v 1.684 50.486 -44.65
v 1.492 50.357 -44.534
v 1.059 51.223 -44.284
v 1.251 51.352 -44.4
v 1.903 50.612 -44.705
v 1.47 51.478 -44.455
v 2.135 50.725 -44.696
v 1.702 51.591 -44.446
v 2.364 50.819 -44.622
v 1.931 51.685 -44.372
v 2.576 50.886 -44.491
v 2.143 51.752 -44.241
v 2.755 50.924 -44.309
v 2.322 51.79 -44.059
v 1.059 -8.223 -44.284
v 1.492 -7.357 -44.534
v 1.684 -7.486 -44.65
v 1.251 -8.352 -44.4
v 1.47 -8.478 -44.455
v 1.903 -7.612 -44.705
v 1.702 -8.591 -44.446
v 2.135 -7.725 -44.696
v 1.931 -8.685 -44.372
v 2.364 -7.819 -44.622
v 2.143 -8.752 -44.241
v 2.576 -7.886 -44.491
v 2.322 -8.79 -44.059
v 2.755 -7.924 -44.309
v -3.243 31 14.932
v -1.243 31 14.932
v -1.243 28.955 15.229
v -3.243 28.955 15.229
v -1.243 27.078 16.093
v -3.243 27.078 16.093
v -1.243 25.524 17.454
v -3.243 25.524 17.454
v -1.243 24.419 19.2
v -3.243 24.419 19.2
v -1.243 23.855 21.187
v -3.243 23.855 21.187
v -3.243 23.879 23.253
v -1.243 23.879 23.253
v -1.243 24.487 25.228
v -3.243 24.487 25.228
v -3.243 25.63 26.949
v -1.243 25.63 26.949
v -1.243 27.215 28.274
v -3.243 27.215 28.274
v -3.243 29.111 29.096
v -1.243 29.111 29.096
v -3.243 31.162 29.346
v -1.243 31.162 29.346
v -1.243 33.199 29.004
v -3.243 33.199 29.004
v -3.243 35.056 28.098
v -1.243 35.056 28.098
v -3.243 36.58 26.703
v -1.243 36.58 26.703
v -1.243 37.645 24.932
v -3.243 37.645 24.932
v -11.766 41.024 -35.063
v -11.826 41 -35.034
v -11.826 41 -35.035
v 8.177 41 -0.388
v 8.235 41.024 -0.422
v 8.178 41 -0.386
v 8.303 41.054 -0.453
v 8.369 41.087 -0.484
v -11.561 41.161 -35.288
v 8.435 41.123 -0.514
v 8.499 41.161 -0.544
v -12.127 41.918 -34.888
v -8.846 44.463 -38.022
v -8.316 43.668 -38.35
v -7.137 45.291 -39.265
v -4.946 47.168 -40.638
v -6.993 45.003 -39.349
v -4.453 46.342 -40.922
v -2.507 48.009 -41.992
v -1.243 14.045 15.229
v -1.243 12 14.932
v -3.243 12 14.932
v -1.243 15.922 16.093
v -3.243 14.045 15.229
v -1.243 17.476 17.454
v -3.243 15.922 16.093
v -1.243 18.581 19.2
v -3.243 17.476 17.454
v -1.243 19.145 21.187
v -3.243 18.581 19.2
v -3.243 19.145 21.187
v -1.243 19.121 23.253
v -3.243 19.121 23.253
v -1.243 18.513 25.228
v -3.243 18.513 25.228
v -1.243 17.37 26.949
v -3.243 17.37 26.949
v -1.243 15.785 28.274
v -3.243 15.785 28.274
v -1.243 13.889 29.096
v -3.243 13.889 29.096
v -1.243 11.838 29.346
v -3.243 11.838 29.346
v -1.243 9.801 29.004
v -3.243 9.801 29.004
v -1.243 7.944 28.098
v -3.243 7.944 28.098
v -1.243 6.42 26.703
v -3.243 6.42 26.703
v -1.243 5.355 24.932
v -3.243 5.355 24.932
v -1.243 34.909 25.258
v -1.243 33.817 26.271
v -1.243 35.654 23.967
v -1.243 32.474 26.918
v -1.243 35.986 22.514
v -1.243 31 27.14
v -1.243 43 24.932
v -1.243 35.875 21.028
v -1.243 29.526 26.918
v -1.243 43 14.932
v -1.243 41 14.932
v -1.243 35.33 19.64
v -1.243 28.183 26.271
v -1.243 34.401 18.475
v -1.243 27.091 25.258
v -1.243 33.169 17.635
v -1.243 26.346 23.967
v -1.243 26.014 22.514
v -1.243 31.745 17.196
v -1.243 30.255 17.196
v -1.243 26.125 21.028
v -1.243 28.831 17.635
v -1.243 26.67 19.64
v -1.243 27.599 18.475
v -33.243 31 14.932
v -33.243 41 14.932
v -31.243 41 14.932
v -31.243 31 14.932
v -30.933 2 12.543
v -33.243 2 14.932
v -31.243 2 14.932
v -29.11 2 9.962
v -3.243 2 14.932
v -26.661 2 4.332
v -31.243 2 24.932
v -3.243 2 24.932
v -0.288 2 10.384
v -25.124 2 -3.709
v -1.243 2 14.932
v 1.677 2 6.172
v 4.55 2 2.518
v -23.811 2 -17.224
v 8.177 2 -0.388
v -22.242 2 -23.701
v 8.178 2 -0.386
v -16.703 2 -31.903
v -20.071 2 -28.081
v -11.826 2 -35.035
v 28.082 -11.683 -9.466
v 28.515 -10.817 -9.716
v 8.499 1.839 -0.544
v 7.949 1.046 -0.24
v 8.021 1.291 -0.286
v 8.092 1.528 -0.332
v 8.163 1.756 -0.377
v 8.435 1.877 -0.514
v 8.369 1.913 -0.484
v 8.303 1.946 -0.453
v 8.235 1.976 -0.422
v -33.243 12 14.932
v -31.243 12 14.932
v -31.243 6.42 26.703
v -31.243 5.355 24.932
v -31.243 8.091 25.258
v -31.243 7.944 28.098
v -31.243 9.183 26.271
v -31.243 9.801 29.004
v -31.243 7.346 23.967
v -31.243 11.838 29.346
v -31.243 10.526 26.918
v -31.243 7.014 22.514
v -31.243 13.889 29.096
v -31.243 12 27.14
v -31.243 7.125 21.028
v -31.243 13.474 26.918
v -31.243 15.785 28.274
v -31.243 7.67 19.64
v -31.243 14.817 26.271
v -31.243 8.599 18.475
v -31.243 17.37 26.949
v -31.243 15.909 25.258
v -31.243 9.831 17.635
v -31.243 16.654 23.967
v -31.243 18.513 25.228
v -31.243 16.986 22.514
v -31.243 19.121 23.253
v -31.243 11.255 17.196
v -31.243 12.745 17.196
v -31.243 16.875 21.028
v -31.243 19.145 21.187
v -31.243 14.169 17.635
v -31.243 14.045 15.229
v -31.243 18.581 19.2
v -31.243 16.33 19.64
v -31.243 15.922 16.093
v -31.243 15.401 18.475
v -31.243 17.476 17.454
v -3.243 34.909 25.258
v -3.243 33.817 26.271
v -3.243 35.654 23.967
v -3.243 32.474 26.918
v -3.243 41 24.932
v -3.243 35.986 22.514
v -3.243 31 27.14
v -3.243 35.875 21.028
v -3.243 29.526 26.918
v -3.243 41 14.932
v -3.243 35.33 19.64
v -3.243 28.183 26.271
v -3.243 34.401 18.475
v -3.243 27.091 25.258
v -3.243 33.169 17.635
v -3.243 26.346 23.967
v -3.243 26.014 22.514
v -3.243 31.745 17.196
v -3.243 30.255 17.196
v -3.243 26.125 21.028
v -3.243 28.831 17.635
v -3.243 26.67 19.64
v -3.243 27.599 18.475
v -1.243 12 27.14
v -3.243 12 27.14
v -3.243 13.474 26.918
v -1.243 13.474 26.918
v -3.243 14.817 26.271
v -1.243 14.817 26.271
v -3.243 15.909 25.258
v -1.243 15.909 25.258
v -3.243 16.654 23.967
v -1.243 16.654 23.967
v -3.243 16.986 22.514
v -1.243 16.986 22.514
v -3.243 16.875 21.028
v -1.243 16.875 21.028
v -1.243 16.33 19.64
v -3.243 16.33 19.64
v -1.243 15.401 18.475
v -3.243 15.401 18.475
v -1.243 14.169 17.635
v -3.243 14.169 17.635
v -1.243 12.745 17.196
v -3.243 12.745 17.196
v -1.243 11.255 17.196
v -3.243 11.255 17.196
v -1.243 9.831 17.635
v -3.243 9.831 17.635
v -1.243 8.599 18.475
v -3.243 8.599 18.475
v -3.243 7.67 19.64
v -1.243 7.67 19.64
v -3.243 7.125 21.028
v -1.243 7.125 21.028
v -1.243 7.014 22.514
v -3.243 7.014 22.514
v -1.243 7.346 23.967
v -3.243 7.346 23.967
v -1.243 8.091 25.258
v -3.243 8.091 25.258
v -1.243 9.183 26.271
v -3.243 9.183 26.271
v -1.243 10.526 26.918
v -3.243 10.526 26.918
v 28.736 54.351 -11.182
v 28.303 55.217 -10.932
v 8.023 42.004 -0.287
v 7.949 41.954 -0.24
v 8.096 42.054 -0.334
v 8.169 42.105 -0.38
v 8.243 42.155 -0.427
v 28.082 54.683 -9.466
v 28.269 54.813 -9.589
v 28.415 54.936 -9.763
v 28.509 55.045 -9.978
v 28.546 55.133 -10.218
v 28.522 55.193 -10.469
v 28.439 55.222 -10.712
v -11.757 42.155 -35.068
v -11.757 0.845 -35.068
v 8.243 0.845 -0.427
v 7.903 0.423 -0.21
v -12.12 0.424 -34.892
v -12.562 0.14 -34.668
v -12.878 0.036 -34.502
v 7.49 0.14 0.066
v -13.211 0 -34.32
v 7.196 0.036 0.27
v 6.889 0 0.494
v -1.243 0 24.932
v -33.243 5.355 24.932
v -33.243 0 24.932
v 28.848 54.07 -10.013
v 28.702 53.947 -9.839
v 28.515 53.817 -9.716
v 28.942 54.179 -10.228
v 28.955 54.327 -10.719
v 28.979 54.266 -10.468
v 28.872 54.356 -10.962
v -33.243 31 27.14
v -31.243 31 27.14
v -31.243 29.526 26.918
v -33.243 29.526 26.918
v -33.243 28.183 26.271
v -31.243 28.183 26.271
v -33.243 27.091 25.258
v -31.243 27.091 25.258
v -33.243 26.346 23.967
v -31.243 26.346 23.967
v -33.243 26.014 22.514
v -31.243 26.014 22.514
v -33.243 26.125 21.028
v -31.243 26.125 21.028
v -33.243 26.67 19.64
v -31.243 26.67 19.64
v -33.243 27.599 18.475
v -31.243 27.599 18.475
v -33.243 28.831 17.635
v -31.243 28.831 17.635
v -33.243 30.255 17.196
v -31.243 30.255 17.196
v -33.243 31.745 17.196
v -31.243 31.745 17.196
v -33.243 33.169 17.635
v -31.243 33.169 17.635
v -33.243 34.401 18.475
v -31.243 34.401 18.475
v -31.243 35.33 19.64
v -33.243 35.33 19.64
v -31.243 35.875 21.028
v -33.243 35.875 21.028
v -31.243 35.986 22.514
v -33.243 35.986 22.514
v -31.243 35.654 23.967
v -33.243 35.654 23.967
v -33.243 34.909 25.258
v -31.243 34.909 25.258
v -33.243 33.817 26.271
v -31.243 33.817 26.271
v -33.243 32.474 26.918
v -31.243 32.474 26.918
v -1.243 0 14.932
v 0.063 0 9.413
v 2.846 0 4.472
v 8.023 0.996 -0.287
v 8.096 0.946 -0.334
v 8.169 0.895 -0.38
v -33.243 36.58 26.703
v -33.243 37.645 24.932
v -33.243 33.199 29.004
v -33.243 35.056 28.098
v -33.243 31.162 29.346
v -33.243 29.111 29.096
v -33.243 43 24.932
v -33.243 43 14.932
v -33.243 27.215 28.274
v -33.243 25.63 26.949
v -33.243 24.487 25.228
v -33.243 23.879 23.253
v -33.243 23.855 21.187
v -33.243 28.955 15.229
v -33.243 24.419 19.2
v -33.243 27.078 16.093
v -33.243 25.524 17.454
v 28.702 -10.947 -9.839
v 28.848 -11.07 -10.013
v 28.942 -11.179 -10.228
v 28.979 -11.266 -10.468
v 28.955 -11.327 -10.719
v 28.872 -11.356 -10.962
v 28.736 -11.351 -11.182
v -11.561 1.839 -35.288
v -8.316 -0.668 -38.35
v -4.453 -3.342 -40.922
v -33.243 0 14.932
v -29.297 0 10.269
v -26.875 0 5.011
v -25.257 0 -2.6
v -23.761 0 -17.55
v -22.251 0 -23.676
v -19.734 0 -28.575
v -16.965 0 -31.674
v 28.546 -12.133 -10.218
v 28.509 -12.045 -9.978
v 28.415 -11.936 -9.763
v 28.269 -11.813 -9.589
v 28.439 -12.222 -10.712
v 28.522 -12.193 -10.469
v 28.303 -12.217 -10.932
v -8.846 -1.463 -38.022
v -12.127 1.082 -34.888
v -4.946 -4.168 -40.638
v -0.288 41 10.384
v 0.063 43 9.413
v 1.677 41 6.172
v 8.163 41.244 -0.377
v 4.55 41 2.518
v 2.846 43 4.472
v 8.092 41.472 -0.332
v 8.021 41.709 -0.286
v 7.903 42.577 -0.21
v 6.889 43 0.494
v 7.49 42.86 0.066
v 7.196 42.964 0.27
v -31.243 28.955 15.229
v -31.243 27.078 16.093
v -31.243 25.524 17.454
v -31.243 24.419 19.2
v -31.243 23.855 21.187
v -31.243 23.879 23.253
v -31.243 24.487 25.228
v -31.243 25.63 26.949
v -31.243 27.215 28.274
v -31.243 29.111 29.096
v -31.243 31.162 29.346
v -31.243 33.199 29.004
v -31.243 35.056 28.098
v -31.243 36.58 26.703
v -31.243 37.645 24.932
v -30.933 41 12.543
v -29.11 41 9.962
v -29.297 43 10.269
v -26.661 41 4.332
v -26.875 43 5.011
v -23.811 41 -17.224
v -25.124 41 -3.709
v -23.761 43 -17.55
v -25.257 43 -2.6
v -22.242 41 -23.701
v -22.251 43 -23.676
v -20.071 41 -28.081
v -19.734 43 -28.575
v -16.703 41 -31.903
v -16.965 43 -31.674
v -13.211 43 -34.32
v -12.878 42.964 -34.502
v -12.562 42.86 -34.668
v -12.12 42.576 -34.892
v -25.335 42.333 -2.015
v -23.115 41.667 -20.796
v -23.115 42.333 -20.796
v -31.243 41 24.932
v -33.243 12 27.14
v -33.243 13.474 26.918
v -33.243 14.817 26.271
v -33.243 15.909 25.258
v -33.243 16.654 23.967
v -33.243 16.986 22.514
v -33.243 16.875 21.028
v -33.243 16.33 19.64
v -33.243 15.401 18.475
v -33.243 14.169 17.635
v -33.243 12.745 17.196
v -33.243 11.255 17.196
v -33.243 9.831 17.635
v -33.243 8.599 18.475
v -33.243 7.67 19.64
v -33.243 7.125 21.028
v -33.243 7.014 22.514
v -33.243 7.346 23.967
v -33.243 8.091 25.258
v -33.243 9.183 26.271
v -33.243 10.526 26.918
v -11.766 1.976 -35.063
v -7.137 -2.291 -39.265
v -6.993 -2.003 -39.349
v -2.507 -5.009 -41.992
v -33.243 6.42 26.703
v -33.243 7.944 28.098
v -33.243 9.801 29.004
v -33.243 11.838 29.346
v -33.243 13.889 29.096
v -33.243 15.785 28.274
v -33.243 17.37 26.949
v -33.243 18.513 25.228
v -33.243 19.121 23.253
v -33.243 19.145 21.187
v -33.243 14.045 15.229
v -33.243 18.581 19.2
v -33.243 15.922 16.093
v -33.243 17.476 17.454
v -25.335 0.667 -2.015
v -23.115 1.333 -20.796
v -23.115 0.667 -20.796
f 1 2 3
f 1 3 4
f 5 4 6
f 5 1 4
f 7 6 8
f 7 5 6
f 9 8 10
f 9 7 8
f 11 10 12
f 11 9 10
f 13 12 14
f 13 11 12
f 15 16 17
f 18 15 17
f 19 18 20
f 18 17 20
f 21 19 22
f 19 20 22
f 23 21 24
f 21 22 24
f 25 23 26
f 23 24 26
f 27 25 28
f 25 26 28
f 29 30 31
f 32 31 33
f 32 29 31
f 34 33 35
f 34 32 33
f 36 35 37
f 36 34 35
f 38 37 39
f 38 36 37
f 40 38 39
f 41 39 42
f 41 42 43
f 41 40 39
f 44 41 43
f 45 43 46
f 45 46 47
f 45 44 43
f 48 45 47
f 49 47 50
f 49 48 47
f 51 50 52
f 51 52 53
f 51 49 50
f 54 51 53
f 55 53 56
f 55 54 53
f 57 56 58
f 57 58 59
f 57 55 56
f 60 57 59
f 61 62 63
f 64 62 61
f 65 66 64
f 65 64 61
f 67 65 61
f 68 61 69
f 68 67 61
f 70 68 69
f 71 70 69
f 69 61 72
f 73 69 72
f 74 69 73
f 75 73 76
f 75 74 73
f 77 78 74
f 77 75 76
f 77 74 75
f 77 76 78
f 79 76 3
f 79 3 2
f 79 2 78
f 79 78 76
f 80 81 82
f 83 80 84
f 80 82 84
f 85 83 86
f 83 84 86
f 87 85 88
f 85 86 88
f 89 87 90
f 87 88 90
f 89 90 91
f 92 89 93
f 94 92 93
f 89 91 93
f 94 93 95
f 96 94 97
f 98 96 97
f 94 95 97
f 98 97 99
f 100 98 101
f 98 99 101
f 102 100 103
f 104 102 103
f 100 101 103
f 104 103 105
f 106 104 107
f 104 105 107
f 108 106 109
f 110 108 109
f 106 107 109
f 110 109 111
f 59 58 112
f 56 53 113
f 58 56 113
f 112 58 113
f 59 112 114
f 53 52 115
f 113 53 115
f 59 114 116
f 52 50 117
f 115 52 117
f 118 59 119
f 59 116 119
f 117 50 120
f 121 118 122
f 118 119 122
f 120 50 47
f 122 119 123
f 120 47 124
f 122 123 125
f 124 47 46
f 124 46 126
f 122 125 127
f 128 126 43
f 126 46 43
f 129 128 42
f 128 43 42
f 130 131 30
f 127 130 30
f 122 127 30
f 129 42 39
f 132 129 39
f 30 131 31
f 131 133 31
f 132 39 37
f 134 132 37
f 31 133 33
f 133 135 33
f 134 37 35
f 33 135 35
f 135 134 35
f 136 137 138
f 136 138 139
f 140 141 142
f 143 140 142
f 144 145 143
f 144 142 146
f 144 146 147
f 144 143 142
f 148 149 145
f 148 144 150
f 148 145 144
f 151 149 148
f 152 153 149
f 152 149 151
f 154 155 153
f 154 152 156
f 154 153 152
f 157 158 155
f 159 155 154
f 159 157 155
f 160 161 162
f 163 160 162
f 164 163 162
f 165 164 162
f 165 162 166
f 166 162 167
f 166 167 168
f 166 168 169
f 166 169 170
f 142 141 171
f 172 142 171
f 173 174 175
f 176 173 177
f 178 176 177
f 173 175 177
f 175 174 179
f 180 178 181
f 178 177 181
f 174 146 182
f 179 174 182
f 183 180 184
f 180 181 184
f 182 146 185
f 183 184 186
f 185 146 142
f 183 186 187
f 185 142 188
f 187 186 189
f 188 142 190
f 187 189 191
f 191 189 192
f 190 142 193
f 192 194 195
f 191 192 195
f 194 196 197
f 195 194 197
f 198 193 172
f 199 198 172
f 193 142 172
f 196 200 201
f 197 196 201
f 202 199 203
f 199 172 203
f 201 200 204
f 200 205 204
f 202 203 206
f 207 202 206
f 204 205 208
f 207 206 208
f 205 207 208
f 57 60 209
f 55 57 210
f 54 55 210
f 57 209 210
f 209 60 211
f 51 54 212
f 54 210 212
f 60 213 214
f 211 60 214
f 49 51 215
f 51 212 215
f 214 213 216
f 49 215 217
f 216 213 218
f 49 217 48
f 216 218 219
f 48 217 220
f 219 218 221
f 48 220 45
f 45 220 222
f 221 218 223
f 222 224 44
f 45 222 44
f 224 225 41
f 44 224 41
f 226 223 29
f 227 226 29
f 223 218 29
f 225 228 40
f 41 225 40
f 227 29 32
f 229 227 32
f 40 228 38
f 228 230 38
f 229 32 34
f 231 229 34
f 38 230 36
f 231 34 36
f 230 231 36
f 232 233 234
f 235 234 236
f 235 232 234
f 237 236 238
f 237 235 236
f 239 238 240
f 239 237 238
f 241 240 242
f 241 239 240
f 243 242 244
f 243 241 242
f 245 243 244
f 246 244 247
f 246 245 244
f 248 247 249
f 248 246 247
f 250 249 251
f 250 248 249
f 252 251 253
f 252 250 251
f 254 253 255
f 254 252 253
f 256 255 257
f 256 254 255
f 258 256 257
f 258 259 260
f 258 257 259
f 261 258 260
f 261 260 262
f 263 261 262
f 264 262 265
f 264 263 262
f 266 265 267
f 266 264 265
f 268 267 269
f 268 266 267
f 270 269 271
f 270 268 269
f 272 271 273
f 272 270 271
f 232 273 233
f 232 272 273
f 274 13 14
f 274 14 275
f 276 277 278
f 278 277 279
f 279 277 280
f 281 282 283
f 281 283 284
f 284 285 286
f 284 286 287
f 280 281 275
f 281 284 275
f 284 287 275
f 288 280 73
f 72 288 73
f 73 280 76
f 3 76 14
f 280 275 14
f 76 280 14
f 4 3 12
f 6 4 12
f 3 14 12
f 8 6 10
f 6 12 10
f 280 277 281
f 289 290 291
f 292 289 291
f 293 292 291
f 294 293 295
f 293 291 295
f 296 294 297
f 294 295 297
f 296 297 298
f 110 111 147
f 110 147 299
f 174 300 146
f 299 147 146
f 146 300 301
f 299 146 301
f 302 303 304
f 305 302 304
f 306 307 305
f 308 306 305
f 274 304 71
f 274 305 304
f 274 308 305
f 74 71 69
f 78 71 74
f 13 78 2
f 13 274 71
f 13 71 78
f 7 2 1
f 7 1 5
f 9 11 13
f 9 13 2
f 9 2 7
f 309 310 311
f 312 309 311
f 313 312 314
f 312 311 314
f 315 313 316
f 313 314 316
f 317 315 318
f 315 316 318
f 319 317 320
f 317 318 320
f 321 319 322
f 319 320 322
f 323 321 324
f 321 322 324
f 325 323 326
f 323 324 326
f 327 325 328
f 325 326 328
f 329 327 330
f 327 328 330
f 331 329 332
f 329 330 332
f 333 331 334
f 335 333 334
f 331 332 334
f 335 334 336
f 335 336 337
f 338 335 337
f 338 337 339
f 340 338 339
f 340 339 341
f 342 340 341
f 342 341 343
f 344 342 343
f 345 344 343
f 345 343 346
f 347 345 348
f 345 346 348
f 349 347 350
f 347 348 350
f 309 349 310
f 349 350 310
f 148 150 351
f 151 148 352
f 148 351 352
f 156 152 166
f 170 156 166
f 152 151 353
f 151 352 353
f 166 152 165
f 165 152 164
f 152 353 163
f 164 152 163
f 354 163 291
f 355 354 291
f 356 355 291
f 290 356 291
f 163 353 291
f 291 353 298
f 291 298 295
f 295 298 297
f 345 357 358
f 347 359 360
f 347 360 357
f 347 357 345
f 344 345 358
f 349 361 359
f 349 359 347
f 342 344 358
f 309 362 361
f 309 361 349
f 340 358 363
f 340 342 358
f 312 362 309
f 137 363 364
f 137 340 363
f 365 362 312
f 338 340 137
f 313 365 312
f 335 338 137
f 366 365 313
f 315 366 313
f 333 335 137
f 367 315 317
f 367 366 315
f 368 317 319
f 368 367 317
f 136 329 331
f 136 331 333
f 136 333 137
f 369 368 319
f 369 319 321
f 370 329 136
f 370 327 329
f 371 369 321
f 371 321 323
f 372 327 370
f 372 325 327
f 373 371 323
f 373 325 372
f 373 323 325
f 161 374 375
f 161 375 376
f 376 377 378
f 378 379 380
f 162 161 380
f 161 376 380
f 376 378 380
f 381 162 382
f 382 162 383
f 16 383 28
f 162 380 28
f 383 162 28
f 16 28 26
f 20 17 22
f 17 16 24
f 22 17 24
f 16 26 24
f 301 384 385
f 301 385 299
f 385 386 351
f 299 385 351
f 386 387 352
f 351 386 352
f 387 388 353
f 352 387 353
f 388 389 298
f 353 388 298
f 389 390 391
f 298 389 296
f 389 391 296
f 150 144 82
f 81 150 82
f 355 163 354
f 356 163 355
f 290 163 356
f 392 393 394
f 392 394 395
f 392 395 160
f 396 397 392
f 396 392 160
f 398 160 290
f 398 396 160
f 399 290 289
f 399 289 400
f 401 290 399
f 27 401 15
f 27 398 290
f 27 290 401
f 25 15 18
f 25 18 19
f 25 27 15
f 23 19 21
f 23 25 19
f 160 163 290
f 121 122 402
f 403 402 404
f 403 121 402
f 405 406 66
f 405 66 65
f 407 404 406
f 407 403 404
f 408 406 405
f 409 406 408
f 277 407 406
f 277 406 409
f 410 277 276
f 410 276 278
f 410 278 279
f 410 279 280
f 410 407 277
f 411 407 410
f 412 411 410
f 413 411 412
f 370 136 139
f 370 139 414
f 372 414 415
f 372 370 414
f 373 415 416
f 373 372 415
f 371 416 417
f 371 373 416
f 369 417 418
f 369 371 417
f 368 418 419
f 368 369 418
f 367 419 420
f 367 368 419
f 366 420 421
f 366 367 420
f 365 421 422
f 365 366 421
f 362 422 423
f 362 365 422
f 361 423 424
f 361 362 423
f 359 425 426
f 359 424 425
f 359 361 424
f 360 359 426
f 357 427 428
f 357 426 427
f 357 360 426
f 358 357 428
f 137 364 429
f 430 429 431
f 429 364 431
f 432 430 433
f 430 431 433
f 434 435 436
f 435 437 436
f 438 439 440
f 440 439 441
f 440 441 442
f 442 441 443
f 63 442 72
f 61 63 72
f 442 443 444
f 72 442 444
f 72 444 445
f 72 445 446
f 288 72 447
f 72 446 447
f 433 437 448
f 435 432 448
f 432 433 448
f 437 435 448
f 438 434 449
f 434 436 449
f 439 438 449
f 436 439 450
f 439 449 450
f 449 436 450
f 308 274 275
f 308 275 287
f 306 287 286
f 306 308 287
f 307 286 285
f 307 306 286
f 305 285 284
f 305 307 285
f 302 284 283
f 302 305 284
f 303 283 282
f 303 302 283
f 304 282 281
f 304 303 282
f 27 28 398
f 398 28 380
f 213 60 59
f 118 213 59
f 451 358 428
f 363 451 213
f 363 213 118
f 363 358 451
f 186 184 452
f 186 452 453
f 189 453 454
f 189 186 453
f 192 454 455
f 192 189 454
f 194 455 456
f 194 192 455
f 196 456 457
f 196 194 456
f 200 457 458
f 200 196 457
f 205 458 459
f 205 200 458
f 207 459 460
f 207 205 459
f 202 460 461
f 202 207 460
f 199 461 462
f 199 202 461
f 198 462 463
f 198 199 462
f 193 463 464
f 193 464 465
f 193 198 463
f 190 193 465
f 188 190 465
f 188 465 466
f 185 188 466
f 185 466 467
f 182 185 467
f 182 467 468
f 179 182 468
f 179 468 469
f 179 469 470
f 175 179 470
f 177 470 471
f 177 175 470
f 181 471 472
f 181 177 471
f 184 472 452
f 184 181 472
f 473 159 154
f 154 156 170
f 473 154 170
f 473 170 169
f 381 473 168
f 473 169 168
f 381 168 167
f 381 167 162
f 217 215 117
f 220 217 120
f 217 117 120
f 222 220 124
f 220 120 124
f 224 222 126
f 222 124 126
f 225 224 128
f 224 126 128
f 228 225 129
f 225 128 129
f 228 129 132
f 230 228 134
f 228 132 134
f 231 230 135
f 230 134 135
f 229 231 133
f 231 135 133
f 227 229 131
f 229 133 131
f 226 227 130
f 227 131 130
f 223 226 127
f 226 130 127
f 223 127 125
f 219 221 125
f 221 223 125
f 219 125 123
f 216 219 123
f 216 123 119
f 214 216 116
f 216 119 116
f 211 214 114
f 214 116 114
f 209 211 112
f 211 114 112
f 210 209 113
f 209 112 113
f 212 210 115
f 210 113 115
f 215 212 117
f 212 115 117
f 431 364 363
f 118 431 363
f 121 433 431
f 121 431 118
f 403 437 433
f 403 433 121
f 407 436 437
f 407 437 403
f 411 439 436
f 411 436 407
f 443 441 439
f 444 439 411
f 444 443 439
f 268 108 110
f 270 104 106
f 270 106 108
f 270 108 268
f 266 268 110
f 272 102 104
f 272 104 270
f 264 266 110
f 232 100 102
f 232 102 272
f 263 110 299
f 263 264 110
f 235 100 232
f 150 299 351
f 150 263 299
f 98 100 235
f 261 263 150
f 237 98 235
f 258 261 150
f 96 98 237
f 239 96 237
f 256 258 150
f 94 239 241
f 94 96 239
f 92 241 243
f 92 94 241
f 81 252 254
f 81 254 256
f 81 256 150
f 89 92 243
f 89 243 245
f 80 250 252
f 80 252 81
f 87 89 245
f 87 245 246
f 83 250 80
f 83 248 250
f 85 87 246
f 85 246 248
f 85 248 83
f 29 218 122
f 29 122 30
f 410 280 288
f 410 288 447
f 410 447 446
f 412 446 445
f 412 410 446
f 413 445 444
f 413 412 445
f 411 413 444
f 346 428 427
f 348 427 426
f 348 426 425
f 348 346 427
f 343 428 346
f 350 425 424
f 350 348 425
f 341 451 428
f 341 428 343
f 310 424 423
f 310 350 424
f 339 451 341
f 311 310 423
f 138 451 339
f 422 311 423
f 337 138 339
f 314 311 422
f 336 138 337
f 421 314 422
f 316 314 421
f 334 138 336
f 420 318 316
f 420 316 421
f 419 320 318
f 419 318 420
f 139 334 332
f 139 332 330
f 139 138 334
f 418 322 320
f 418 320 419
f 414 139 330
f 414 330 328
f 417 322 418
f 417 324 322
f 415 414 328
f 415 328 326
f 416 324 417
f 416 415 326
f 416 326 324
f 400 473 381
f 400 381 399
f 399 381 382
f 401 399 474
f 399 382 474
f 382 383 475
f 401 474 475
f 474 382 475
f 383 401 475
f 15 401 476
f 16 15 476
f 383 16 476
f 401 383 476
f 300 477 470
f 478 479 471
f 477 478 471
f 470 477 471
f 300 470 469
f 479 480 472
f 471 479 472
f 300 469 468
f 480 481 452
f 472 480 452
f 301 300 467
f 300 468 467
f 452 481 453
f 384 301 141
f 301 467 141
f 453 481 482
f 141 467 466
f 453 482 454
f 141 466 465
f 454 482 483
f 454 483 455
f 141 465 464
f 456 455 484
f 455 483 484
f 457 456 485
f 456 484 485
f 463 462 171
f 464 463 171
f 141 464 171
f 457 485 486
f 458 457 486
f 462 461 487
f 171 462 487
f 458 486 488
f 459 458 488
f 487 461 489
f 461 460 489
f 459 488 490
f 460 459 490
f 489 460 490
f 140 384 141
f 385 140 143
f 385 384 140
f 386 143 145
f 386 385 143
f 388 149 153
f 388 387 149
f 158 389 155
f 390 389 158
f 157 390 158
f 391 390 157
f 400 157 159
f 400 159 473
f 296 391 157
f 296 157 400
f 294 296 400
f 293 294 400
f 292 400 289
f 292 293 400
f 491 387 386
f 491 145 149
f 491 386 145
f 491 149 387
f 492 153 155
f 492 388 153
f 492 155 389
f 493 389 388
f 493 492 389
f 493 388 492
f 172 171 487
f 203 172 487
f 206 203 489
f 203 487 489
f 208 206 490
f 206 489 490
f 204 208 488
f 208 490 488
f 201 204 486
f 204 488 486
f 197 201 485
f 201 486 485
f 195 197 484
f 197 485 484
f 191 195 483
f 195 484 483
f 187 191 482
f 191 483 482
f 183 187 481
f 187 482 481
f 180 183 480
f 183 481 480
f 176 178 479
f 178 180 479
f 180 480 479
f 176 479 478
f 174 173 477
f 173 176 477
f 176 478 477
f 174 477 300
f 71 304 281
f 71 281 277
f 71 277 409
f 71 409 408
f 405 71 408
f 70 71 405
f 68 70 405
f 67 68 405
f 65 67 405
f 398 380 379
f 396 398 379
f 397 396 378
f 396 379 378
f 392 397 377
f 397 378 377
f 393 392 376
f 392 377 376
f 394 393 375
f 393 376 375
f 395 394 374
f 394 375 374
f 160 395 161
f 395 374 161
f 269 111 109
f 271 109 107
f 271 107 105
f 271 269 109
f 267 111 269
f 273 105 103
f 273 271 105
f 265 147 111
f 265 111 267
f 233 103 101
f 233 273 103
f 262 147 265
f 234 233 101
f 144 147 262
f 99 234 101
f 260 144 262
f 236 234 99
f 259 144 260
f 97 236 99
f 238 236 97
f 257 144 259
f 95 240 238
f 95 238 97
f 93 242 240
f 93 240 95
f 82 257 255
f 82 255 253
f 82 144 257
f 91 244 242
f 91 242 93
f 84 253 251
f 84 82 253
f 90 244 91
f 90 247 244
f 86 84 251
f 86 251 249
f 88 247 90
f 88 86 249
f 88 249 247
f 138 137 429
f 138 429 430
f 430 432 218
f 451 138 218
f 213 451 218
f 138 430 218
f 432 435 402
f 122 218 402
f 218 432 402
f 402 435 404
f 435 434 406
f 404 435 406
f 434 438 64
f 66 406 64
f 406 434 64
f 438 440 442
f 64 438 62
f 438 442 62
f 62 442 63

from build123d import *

# Parameters (mm, degrees)
EXTRUDE_1_DEPTH     = 2
SKETCH_2_R          = 5
EXTRUDE_2_DEPTH     = 16
SKETCH_6_W          = 28
SKETCH_6_H          = 17.402719954
CUT_EXTRUDE_1_DEPTH = 52.997949028
EXTRUDE_3_DEPTH     = 1
FILLET_2_R          = 2
FILLET_3_R          = 2
SKETCH_8_R          = 5.82594274
EXTRUDE_4_DEPTH     = 25
SKETCH_9_W          = 11.65188548
SKETCH_9_H          = 25
CUT_EXTRUDE_2_DEPTH = 22
SKETCH_11_R         = 5.664171458
EXTRUDE_5_DEPTH     = 40
SKETCH_12_W         = 11.328342916
SKETCH_12_H         = 39
CUT_EXTRUDE_3_DEPTH = 20
SKETCH_12_2_W       = 11.328342916
SKETCH_12_2_H       = 39
CUT_EXTRUDE_4_DEPTH = 10


with BuildPart() as part:
    # 草图1 → 凸台-拉伸1 (new body)
    with BuildSketch(Plane(origin=(0, 0, 0), x_dir=(1, 0, 0), z_dir=(0, 1, 0))):
        with BuildLine():
            Line((-33.243243243, -24.932432432), (-1.243243243, -24.932432432))
            Line((-1.243243243, -24.932432432), (-1.243243243, -14.932432432))
            ThreePointArc((-1.243243243, -14.932432432), (1.697148643, -6.13940818), (8.243243243, 0.426551416))
            Line((8.243243243, 0.426551416), (-11.756756757, 35.067567568))
            add(Edge.make_bspline(
                [(-33.243243243, -14.932432432), (-17.547932251, -1.015151266), (-32.626133519, 25.165131833), (-11.756756757, 35.067567568)],
                knots=[0, 0, 0, 0, 1, 1, 1, 1], degree=3))
            Line((-33.243243243, -14.932432432), (-33.243243243, -24.932432432))
        make_face()
    extrude(amount=EXTRUDE_1_DEPTH)

    # 草图2 → 凸台-拉伸2 (add, symmetric)
    with BuildSketch(Plane.ZY.offset(17.243243243)):
        with BuildLine():
            Line((14.932432432, 2), (14.932432432, 12))
            ThreePointArc((14.932432432, 12), (26.129367198, 18.003244699), (24.932432432, 5.355017858))
            Line((24.932432432, 5.355017858), (24.932432432, 2))
            Line((24.932432432, 2), (14.932432432, 2))
        make_face()
        with Locations((22.140221816, 12)):
            Circle(SKETCH_2_R, mode=Mode.SUBTRACT)
    extrude(amount=EXTRUDE_2_DEPTH, both=True)

    # 草图6 → 切除-拉伸1 (cut, through all)
    with BuildSketch(Plane.XY):
        with Locations((-17.243243243, 10.701359977)):
            Rectangle(SKETCH_6_W, SKETCH_6_H)
    extrude(amount=CUT_EXTRUDE_1_DEPTH, mode=Mode.SUBTRACT)

    # 草图7 → 凸台-拉伸3 (add)
    with BuildSketch(Plane(origin=(2.341783653, 4.683567307, -1.352029423), x_dir=(0.49999999999999495, 0, 0.8660254037844416), z_dir=(0.43301270189222174, 0.866025403784438, -0.24999999999999803))):
        with BuildLine():
            Line((-36.994807064, 25.214344641), (4.684167628, 32.070006247))
            ThreePointArc((4.684167628, 32.070006247), (5.524135177, 31.818639991), (5.843163839, 31.001969195))
            Line((5.843163839, 31.001969195), (3.752217259, 5.367134614))
            Line((3.752217259, 5.367134614), (3.752217259, 5.300961696))
            Line((3.752217259, 5.300961696), (-36.253180241, 5.300961696))
            Line((-36.253180241, 5.300961696), (-36.247782741, 5.367134614))
            add(Edge.make_bspline(
                [(-36.247782741, 5.367134614), (-38.690167695, 13.725474556), (-37.064789312, 18.95114602), (-37.821789964, 24.081635177)],
                knots=[0, 0, 0, 0, 0.95157929, 0.95157929, 0.95157929, 0.95157929], degree=3))
            ThreePointArc((-37.821789964, 24.081635177), (-37.640152143, 24.817264549), (-36.994807064, 25.214344641))
        make_face()
    extrude(amount=-EXTRUDE_3_DEPTH)

    # 圆角2
    # the kernel refuses this fillet: 2 mm, written as the material it takes off along each edge
    with BuildSketch(Plane(origin=(10.284484696, 0, 3.10898249), x_dir=(-0.8660254037844416, 0, 0.49999999999999495), z_dir=(-0.49999999999999495, 0, -0.8660254037844416))) as fillet_2_piece_1:
        with BuildLine():
            CenterArc((1.632993162, 2), FILLET_2_R, 215.264389683, 54.735610317)
            Line((0, 0.845299462), (-0.032659863, 0.822205451))
            ThreePointArc((-0.032659863, 0.822205451), (-0.04, 0.422649731), (-0.04, 0))
            Line((-0.04, 0), (0, -0.04))
            Line((0, -0.04), (1.632993162, -0.04))
            Line((1.632993162, -0.04), (1.632993162, 0))
        make_face()
    extrude(amount=48.164965809, mode=Mode.SUBTRACT)

    # 圆角3
    # the kernel refuses this fillet: 2 mm, written as the material it takes off along each edge
    with BuildSketch(Plane(origin=(8.679926515, 2.033086459, 0.444421053), x_dir=(0.7500000000000034, -0.499999999999998, -0.4330127018922155), z_dir=(-0.49999999999999495, 0, -0.8660254037844416))) as fillet_3_piece_1:
        with BuildLine():
            CenterArc((0.389050368, 2), FILLET_3_R, 258.783012488, 11.216987512)
            Line((0, 0.038204952), (-0.007781007, -0.001030949))
            ThreePointArc((-0.007781007, -0.001030949), (-0.04, 0.019102476), (-0.04, 0))
            Line((-0.04, 0), (0, -0.04))
            Line((0, -0.04), (0.389050368, -0.04))
            Line((0.389050368, -0.04), (0.389050368, 0))
        make_face()
    extrude(amount=41.950649342, mode=Mode.SUBTRACT)

    # 草图8 → 凸台-拉伸4 (add)
    with BuildSketch(Plane(origin=(0, 2, 0), x_dir=(1, 0, 0), z_dir=(0, 1, 0))):
        with Locations(Location((-15.759203843, -7.518855646, 0), (0, 0, 90))):
            Circle(SKETCH_8_R)
    extrude(amount=EXTRUDE_4_DEPTH)

    # 草图9 → 切除-拉伸2 (cut)
    with BuildSketch(Plane.XY):
        with Locations((-15.759203843, 14.5)):
            Rectangle(SKETCH_9_W, SKETCH_9_H)
    extrude(amount=CUT_EXTRUDE_2_DEPTH, mode=Mode.SUBTRACT)

    # 草图11 → 凸台-拉伸5 (add)
    with BuildSketch(Plane(origin=(0, 2, 0), x_dir=(1, 0, 0), z_dir=(0, 1, 0))):
        with Locations(Location((-15.437441139, -2.706519555, 0), (0, 0, 90))):
            Circle(SKETCH_11_R)
    extrude(amount=EXTRUDE_5_DEPTH)

    # 镜向1: part across plane


with BuildPart() as part_1:
    add(part.part)
    add(part.part.mirror(Plane.ZX.offset(21.5)))

    # 草图12 → 切除-拉伸3 (cut)
    with BuildSketch(Plane.XY):
        with Locations((-15.437441139, 21.5)):
            Rectangle(SKETCH_12_W, SKETCH_12_H)
    extrude(amount=CUT_EXTRUDE_3_DEPTH, mode=Mode.SUBTRACT)

    # 草图12<2> → 切除-拉伸4 (cut)
    with BuildSketch(Plane.XY):
        with Locations((-15.437441139, 21.5)):
            Rectangle(SKETCH_12_2_W, SKETCH_12_2_H)
    extrude(amount=-CUT_EXTRUDE_4_DEPTH, mode=Mode.SUBTRACT)


with BuildPart() as cut_extrude_4_piece_1:
    # of the separate pieces the step leaves, piece 1, a body of its own (cut_extrude_4_pieces)
    add(part_1.part.solids().sort_by_distance((-33.243243243, 5.355017858, 24.932432432))[0])


with BuildPart() as cut_extrude_4_piece_2:
    # of the separate pieces the step leaves, piece 2, a body of its own (cut_extrude_4_pieces)
    add(part_1.part.solids().sort_by_distance((-3.243243243, 41, 14.932432432))[0])


solid = Compound([cut_extrude_4_piece_1.part, cut_extrude_4_piece_2.part])
